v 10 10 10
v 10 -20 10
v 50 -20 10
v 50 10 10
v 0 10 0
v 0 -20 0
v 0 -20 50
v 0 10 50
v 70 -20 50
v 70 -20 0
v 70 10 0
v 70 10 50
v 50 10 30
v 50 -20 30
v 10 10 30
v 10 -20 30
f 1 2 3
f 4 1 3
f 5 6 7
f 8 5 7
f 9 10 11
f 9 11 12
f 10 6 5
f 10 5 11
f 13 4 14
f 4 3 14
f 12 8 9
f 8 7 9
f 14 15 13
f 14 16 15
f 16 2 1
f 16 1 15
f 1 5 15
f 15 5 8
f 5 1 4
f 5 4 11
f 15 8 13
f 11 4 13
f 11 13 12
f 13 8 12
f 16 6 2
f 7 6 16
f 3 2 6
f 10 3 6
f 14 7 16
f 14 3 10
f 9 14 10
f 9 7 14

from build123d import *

# Parameters (mm, degrees)
F0_W        = 70
F0_H        = 50
F0_W_2      = 40
F0_H_2      = 20
F2_DEPTH    = 10
F1_W        = 70
F1_H        = 50
F1_W_2      = 40
F1_H_2      = 20
F2_FACE_W   = 70
F2_FACE_H   = 50
F2_FACE_W_2 = 40
F2_FACE_H_2 = 20
F3_DEPTH    = 10
F4_DEPTH    = 10


with BuildPart() as f2:
    # F0 (on Front) → F2 (new body)
    with BuildSketch(Plane.XZ):
        with Locations((35, 25)):
            Rectangle(F0_W, F0_H)
        with Locations((30, 20)):
            Rectangle(F0_W_2, F0_H_2, mode=Mode.SUBTRACT)
    extrude(amount=F2_DEPTH)

    # F1 (on face) + F2_face (on face) → F3 (join)
    with BuildSketch(Plane.XZ):
        with Locations((35, 25)):
            Rectangle(F1_W, F1_H)
        with Locations((30, 20)):
            Rectangle(F1_W_2, F1_H_2, mode=Mode.SUBTRACT)
    with BuildSketch(Plane(origin=(36.4814814815, -10, 26.4814814815), x_dir=(1, 0, 0), z_dir=(0, -1, 0))):
        with Locations((-1.4814814815, -1.4814814815)):
            Rectangle(F2_FACE_W, F2_FACE_H)
        with Locations((-6.4814814815, -6.4814814815)):
            Rectangle(F2_FACE_W_2, F2_FACE_H_2, mode=Mode.SUBTRACT)
    extrude(amount=F3_DEPTH)

    # F4 (add): faces of the model
    f4_faces = [f2.faces().sort_by_distance(p)[0] for p in [
        (35, 0, 49.1397674733),
        (35, -20, 49.1397674733),
    ]]
    extrude(f4_faces, amount=F4_DEPTH, dir=(0, 1, 0))


solid = f2.part
